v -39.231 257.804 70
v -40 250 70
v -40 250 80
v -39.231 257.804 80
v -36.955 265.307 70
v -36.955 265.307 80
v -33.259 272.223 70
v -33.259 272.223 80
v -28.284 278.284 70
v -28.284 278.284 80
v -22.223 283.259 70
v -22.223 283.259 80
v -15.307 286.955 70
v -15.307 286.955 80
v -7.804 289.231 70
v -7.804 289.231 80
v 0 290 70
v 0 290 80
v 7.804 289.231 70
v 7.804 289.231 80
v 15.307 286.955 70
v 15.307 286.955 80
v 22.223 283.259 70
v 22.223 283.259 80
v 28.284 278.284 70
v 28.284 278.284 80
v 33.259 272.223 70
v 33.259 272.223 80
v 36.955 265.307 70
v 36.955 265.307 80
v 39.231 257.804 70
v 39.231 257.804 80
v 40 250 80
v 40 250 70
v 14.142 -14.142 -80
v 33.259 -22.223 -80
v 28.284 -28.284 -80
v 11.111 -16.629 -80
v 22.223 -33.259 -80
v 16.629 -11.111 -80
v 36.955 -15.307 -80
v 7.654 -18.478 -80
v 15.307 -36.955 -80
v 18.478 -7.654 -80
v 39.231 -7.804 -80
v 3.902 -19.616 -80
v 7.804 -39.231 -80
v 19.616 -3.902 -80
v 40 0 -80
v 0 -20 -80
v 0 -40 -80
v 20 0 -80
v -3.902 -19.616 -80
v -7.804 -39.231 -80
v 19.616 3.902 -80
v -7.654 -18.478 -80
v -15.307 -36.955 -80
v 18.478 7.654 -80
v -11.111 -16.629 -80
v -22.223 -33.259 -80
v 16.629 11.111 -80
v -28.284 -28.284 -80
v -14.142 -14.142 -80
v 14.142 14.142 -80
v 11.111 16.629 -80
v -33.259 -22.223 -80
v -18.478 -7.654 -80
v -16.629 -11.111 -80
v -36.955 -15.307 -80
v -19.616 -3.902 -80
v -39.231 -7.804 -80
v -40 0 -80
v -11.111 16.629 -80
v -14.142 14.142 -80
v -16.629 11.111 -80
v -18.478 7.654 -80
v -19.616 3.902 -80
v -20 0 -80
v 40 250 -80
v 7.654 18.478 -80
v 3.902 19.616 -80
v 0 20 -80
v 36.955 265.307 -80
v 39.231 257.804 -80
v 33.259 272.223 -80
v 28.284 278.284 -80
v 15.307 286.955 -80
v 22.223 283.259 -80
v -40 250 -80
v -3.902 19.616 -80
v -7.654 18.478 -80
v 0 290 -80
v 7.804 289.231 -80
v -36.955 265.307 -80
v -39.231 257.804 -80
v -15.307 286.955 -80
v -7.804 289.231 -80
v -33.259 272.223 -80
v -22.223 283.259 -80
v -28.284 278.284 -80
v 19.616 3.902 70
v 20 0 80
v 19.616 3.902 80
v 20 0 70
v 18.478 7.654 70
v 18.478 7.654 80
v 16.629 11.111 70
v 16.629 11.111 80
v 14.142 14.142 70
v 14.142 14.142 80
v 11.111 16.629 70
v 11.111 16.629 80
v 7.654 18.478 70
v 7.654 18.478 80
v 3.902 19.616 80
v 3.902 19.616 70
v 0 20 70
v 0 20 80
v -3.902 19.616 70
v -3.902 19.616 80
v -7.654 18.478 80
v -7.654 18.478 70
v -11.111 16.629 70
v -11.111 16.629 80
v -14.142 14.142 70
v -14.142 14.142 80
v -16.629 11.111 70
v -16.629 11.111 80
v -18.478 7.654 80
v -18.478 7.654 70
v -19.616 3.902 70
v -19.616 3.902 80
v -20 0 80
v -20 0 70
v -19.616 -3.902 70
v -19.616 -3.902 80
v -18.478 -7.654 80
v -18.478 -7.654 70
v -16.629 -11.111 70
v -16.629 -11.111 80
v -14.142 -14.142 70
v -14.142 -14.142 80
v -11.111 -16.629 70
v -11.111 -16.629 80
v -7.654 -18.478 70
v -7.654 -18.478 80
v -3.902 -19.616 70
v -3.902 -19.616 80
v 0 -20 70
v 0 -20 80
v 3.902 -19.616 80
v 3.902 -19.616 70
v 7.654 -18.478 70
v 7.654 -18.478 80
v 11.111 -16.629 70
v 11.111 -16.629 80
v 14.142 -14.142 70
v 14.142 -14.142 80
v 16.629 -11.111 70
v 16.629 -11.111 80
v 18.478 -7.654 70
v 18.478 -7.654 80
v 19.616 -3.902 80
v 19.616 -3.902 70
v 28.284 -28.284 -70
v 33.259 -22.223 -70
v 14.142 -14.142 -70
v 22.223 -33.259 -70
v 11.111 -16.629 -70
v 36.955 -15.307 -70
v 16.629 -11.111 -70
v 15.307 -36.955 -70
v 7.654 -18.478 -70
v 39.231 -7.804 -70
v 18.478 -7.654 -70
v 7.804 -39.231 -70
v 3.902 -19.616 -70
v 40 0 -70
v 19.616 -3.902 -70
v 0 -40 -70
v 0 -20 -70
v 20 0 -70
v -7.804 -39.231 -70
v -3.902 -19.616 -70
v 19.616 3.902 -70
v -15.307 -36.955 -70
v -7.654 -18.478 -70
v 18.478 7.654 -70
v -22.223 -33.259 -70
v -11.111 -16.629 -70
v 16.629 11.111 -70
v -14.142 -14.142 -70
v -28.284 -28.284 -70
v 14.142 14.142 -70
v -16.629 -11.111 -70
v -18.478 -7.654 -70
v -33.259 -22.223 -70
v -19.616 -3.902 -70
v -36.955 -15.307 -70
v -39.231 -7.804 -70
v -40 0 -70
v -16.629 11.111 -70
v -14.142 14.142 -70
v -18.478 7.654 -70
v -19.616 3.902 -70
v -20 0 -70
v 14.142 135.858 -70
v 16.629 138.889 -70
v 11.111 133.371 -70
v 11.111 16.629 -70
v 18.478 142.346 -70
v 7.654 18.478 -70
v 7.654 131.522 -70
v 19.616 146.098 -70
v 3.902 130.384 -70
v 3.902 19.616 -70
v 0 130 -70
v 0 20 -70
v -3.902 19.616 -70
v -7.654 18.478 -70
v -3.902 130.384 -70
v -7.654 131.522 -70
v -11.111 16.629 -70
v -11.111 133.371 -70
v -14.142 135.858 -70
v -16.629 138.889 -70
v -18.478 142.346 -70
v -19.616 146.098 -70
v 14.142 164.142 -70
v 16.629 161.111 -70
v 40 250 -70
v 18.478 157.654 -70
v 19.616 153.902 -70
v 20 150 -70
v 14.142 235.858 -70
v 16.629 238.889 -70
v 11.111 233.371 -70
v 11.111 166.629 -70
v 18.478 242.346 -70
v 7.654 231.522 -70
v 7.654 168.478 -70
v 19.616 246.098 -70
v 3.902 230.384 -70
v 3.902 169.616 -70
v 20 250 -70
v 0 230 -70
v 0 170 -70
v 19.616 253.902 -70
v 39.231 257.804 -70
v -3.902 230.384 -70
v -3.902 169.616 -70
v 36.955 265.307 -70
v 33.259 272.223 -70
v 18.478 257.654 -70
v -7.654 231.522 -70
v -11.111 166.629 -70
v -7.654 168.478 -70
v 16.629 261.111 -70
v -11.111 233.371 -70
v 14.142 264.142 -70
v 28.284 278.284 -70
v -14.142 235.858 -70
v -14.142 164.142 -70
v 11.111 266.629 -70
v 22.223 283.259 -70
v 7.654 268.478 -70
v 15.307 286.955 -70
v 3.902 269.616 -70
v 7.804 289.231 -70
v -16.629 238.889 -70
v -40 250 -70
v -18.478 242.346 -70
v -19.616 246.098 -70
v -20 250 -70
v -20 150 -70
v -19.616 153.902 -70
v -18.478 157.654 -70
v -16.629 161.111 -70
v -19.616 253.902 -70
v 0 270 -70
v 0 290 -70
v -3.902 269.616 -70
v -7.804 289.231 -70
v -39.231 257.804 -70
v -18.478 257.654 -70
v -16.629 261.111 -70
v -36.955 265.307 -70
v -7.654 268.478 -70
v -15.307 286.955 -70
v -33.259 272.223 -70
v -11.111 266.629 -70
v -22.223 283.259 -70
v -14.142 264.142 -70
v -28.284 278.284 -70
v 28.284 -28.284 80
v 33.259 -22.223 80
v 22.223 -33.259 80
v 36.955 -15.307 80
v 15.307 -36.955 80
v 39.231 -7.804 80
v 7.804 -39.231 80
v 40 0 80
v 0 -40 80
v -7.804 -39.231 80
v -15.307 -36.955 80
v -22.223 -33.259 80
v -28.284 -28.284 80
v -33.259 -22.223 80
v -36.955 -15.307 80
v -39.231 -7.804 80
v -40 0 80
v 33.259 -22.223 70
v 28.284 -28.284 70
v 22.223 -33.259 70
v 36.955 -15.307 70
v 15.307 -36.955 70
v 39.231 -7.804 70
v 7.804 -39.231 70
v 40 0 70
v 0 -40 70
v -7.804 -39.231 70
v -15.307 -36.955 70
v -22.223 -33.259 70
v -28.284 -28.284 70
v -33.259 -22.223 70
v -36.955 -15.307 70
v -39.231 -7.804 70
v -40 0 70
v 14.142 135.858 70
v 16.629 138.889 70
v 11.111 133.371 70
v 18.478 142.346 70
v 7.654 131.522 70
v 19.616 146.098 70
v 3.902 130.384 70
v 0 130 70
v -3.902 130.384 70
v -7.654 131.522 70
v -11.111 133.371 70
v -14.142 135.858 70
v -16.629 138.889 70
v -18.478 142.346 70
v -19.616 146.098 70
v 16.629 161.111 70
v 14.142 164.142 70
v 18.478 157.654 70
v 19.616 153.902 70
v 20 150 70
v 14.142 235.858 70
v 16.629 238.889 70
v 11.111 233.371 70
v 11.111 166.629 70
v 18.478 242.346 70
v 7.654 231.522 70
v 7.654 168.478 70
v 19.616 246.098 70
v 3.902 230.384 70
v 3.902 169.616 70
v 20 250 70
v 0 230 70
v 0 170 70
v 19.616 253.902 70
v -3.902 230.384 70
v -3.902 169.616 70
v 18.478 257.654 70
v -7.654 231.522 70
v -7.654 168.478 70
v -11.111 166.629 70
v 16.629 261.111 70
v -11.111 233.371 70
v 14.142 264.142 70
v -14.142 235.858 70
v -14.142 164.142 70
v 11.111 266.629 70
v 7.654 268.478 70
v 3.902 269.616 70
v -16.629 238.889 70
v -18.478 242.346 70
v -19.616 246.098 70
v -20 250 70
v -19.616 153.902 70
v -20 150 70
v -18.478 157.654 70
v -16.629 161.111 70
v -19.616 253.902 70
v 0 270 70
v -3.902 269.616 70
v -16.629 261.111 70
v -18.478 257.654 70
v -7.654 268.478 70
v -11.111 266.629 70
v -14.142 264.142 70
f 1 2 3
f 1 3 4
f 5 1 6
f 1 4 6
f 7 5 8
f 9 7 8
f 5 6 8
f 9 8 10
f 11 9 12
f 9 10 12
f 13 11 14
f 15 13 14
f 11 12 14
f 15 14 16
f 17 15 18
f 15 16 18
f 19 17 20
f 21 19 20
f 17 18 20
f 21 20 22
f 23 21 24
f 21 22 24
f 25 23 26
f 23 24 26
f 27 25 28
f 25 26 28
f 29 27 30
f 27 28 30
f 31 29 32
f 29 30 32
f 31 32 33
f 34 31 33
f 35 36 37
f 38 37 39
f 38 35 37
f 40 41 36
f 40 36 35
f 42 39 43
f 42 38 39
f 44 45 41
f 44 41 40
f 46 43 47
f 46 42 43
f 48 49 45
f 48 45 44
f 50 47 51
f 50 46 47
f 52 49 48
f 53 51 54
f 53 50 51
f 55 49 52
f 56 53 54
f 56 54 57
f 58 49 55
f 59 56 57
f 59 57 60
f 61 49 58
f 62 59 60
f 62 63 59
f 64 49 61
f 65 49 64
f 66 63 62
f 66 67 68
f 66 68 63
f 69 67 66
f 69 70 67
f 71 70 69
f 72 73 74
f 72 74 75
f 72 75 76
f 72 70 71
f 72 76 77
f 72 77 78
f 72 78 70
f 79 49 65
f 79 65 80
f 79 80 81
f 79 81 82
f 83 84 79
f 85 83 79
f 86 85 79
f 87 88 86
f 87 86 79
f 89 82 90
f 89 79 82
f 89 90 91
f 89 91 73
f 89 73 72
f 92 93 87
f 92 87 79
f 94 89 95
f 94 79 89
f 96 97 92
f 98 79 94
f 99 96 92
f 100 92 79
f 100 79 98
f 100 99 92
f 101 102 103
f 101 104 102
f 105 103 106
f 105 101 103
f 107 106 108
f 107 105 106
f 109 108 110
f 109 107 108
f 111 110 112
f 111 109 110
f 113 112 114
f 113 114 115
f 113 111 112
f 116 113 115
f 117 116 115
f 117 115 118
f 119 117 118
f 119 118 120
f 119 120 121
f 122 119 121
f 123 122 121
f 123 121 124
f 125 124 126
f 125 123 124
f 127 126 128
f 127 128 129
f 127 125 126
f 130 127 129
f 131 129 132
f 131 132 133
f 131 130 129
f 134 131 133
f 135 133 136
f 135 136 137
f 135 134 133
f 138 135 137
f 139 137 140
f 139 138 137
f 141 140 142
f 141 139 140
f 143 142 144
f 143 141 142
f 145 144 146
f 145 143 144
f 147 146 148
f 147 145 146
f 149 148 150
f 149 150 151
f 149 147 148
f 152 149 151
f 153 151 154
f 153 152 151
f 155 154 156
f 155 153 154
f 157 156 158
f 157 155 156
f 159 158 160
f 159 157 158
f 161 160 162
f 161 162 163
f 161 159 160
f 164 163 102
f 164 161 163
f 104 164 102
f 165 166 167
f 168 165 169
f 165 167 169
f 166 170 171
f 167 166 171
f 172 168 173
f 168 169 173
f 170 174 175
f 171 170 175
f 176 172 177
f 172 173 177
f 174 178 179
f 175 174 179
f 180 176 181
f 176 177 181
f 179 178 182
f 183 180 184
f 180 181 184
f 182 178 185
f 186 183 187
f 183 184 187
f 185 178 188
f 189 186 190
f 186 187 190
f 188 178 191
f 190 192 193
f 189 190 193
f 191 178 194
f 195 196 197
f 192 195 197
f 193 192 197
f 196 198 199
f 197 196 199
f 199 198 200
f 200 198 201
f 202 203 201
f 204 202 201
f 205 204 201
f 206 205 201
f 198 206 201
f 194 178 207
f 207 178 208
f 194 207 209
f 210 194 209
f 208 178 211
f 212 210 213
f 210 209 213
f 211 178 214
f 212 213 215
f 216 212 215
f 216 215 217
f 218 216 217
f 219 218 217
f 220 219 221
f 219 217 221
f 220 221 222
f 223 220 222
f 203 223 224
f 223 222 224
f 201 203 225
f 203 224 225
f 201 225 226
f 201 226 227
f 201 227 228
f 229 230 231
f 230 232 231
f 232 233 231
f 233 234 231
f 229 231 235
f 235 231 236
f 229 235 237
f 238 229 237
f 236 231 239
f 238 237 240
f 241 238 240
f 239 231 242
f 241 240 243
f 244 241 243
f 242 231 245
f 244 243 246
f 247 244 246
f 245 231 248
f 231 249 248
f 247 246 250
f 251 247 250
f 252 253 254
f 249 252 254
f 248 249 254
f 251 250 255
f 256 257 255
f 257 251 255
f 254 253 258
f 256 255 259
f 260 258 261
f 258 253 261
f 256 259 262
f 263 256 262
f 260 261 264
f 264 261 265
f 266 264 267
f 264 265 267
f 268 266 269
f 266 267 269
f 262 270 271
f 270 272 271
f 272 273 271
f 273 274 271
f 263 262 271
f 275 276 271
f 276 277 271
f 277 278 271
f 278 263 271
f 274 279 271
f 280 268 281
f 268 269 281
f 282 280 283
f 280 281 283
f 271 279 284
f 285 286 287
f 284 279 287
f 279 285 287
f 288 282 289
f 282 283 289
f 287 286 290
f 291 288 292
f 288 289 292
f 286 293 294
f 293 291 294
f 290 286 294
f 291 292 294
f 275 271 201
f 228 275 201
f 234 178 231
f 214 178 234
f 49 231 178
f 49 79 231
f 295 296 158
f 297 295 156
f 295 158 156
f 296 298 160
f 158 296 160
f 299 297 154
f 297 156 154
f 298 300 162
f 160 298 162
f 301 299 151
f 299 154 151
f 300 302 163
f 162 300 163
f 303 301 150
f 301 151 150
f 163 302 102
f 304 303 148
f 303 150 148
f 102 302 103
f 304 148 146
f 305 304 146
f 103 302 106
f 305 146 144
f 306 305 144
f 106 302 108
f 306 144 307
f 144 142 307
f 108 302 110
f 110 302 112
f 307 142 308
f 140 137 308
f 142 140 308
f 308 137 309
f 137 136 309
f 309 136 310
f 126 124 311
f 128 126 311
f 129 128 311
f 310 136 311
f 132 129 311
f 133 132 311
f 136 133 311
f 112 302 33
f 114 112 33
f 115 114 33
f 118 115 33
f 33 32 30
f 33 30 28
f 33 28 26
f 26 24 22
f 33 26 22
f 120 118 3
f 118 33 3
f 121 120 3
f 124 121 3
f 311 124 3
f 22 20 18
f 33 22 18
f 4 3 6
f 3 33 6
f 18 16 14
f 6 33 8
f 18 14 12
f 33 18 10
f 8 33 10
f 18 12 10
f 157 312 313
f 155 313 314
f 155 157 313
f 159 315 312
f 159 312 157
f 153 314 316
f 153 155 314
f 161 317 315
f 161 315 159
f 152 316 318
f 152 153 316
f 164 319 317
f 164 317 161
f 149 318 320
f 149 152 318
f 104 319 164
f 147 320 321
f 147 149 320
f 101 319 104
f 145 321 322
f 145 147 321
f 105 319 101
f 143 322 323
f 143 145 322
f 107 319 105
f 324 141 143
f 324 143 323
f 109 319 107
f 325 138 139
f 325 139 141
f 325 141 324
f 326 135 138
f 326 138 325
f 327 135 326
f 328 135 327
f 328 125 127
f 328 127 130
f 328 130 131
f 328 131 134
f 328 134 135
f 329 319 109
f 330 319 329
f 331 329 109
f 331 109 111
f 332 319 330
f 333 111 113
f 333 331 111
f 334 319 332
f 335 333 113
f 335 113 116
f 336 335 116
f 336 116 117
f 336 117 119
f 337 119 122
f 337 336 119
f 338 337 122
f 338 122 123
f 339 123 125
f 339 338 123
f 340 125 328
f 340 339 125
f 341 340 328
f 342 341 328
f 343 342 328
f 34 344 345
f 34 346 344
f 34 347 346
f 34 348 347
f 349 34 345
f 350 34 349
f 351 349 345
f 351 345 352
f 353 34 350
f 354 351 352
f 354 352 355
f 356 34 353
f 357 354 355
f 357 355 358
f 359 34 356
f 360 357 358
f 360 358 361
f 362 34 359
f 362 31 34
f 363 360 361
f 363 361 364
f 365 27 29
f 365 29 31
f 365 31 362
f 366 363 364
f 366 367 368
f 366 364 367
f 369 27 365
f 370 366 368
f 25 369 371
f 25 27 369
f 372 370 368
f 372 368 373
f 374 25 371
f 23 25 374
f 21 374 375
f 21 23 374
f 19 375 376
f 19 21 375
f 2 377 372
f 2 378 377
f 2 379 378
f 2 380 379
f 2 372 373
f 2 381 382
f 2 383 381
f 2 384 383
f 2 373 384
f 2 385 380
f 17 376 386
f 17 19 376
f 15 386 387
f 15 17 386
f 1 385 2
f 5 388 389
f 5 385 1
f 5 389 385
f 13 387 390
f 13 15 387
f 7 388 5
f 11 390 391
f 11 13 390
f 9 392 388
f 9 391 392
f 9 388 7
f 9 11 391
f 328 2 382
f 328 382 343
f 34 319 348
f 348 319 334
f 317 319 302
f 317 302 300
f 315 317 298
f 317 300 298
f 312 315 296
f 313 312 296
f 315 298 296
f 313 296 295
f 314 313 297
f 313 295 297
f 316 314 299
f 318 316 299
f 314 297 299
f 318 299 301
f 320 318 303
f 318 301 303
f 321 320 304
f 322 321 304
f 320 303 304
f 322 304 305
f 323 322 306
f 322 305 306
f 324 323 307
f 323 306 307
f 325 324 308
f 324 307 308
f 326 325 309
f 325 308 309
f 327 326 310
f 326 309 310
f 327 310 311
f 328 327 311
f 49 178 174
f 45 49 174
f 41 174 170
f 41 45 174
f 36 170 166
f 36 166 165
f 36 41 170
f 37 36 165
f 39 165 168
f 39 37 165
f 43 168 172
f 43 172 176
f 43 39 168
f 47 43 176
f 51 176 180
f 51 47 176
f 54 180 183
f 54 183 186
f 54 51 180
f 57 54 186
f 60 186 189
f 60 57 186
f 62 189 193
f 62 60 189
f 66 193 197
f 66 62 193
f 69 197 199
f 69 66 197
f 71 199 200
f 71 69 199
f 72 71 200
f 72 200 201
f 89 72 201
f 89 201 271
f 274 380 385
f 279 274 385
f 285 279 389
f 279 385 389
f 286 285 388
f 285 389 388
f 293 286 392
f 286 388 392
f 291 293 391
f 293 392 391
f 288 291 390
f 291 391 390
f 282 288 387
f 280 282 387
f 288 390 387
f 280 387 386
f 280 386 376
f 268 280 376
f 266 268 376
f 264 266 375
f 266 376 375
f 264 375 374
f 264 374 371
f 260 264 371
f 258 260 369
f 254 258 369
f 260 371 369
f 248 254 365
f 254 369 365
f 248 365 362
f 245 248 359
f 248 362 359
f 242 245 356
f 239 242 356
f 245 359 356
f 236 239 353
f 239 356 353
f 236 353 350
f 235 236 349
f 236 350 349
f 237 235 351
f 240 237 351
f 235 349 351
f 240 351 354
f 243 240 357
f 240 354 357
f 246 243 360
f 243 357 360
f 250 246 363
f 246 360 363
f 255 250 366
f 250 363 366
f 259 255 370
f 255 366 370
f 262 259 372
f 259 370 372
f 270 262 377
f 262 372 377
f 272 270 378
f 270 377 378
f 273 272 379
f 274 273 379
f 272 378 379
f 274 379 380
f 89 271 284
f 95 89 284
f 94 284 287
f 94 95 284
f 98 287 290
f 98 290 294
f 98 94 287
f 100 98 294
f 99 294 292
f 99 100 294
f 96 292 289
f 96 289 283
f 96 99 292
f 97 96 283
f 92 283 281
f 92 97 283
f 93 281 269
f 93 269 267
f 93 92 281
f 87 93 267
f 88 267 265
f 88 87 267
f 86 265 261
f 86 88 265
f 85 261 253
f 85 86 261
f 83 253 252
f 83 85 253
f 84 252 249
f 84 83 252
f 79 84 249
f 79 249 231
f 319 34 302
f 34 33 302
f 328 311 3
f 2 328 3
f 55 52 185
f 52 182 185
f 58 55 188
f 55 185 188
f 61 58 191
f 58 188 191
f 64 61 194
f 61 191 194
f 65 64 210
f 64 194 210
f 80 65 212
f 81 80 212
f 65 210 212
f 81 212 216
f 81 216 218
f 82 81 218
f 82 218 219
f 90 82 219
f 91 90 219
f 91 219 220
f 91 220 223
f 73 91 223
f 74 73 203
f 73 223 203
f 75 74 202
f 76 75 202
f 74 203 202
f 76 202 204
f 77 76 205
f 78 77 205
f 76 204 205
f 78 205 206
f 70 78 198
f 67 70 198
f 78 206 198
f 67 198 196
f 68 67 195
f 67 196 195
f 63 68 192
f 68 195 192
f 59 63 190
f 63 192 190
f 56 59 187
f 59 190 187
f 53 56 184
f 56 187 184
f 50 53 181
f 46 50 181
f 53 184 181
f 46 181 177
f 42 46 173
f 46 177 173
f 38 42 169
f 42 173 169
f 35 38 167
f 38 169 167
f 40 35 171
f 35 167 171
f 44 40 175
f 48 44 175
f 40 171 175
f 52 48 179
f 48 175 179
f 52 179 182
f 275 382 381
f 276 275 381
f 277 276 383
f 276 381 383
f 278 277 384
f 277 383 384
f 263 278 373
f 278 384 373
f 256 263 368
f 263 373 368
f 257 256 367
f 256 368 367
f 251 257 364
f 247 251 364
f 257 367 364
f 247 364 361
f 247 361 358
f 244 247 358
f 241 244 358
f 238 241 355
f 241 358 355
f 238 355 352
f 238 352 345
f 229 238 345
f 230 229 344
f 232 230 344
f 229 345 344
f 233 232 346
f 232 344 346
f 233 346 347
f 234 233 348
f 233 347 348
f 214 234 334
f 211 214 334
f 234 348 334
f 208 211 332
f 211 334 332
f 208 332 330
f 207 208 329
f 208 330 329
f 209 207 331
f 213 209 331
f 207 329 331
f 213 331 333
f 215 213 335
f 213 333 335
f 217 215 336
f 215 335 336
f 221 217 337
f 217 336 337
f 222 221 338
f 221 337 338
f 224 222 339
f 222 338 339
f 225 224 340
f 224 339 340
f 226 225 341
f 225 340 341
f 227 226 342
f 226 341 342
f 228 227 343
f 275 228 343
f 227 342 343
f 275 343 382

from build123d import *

# Parameters (mm, degrees)
BOSS_EXTRUDE1_START = 75
SKETCH1_R           = 20
BOSS_EXTRUDE1_DEPTH = 5
SKETCH2_R           = 20
BOSS_EXTRUDE2_DEPTH = 140


with BuildPart() as part:
    # Sketch1 → Boss-Extrude1 (new body, symmetric)
    with BuildSketch(Plane.XY.offset(BOSS_EXTRUDE1_START)):
        with BuildLine():
            Line((-40, 0), (-40, 250))
            ThreePointArc((-40, 250), (0, 290), (40, 250))
            Line((40, 250), (40, 0))
            ThreePointArc((40, 0), (0, -40), (-40, 0))
        make_face()
        Circle(SKETCH1_R, mode=Mode.SUBTRACT)
    boss_extrude1 = extrude(amount=BOSS_EXTRUDE1_DEPTH, both=True)

    # Sketch2 → Boss-Extrude2 (add)
    with BuildSketch(Plane(origin=(0, 0, 70), x_dir=(-1, 0, 0), z_dir=(0, 0, -1))):
        with Locations((0, 250)):
            Circle(SKETCH2_R)
        with Locations((0, 150)):
            Circle(SKETCH2_R)
    extrude(amount=BOSS_EXTRUDE2_DEPTH)

    # Mirror2: Boss-Extrude1 across plane
    add(boss_extrude1.mirror(Plane.XY))


solid = part.part
